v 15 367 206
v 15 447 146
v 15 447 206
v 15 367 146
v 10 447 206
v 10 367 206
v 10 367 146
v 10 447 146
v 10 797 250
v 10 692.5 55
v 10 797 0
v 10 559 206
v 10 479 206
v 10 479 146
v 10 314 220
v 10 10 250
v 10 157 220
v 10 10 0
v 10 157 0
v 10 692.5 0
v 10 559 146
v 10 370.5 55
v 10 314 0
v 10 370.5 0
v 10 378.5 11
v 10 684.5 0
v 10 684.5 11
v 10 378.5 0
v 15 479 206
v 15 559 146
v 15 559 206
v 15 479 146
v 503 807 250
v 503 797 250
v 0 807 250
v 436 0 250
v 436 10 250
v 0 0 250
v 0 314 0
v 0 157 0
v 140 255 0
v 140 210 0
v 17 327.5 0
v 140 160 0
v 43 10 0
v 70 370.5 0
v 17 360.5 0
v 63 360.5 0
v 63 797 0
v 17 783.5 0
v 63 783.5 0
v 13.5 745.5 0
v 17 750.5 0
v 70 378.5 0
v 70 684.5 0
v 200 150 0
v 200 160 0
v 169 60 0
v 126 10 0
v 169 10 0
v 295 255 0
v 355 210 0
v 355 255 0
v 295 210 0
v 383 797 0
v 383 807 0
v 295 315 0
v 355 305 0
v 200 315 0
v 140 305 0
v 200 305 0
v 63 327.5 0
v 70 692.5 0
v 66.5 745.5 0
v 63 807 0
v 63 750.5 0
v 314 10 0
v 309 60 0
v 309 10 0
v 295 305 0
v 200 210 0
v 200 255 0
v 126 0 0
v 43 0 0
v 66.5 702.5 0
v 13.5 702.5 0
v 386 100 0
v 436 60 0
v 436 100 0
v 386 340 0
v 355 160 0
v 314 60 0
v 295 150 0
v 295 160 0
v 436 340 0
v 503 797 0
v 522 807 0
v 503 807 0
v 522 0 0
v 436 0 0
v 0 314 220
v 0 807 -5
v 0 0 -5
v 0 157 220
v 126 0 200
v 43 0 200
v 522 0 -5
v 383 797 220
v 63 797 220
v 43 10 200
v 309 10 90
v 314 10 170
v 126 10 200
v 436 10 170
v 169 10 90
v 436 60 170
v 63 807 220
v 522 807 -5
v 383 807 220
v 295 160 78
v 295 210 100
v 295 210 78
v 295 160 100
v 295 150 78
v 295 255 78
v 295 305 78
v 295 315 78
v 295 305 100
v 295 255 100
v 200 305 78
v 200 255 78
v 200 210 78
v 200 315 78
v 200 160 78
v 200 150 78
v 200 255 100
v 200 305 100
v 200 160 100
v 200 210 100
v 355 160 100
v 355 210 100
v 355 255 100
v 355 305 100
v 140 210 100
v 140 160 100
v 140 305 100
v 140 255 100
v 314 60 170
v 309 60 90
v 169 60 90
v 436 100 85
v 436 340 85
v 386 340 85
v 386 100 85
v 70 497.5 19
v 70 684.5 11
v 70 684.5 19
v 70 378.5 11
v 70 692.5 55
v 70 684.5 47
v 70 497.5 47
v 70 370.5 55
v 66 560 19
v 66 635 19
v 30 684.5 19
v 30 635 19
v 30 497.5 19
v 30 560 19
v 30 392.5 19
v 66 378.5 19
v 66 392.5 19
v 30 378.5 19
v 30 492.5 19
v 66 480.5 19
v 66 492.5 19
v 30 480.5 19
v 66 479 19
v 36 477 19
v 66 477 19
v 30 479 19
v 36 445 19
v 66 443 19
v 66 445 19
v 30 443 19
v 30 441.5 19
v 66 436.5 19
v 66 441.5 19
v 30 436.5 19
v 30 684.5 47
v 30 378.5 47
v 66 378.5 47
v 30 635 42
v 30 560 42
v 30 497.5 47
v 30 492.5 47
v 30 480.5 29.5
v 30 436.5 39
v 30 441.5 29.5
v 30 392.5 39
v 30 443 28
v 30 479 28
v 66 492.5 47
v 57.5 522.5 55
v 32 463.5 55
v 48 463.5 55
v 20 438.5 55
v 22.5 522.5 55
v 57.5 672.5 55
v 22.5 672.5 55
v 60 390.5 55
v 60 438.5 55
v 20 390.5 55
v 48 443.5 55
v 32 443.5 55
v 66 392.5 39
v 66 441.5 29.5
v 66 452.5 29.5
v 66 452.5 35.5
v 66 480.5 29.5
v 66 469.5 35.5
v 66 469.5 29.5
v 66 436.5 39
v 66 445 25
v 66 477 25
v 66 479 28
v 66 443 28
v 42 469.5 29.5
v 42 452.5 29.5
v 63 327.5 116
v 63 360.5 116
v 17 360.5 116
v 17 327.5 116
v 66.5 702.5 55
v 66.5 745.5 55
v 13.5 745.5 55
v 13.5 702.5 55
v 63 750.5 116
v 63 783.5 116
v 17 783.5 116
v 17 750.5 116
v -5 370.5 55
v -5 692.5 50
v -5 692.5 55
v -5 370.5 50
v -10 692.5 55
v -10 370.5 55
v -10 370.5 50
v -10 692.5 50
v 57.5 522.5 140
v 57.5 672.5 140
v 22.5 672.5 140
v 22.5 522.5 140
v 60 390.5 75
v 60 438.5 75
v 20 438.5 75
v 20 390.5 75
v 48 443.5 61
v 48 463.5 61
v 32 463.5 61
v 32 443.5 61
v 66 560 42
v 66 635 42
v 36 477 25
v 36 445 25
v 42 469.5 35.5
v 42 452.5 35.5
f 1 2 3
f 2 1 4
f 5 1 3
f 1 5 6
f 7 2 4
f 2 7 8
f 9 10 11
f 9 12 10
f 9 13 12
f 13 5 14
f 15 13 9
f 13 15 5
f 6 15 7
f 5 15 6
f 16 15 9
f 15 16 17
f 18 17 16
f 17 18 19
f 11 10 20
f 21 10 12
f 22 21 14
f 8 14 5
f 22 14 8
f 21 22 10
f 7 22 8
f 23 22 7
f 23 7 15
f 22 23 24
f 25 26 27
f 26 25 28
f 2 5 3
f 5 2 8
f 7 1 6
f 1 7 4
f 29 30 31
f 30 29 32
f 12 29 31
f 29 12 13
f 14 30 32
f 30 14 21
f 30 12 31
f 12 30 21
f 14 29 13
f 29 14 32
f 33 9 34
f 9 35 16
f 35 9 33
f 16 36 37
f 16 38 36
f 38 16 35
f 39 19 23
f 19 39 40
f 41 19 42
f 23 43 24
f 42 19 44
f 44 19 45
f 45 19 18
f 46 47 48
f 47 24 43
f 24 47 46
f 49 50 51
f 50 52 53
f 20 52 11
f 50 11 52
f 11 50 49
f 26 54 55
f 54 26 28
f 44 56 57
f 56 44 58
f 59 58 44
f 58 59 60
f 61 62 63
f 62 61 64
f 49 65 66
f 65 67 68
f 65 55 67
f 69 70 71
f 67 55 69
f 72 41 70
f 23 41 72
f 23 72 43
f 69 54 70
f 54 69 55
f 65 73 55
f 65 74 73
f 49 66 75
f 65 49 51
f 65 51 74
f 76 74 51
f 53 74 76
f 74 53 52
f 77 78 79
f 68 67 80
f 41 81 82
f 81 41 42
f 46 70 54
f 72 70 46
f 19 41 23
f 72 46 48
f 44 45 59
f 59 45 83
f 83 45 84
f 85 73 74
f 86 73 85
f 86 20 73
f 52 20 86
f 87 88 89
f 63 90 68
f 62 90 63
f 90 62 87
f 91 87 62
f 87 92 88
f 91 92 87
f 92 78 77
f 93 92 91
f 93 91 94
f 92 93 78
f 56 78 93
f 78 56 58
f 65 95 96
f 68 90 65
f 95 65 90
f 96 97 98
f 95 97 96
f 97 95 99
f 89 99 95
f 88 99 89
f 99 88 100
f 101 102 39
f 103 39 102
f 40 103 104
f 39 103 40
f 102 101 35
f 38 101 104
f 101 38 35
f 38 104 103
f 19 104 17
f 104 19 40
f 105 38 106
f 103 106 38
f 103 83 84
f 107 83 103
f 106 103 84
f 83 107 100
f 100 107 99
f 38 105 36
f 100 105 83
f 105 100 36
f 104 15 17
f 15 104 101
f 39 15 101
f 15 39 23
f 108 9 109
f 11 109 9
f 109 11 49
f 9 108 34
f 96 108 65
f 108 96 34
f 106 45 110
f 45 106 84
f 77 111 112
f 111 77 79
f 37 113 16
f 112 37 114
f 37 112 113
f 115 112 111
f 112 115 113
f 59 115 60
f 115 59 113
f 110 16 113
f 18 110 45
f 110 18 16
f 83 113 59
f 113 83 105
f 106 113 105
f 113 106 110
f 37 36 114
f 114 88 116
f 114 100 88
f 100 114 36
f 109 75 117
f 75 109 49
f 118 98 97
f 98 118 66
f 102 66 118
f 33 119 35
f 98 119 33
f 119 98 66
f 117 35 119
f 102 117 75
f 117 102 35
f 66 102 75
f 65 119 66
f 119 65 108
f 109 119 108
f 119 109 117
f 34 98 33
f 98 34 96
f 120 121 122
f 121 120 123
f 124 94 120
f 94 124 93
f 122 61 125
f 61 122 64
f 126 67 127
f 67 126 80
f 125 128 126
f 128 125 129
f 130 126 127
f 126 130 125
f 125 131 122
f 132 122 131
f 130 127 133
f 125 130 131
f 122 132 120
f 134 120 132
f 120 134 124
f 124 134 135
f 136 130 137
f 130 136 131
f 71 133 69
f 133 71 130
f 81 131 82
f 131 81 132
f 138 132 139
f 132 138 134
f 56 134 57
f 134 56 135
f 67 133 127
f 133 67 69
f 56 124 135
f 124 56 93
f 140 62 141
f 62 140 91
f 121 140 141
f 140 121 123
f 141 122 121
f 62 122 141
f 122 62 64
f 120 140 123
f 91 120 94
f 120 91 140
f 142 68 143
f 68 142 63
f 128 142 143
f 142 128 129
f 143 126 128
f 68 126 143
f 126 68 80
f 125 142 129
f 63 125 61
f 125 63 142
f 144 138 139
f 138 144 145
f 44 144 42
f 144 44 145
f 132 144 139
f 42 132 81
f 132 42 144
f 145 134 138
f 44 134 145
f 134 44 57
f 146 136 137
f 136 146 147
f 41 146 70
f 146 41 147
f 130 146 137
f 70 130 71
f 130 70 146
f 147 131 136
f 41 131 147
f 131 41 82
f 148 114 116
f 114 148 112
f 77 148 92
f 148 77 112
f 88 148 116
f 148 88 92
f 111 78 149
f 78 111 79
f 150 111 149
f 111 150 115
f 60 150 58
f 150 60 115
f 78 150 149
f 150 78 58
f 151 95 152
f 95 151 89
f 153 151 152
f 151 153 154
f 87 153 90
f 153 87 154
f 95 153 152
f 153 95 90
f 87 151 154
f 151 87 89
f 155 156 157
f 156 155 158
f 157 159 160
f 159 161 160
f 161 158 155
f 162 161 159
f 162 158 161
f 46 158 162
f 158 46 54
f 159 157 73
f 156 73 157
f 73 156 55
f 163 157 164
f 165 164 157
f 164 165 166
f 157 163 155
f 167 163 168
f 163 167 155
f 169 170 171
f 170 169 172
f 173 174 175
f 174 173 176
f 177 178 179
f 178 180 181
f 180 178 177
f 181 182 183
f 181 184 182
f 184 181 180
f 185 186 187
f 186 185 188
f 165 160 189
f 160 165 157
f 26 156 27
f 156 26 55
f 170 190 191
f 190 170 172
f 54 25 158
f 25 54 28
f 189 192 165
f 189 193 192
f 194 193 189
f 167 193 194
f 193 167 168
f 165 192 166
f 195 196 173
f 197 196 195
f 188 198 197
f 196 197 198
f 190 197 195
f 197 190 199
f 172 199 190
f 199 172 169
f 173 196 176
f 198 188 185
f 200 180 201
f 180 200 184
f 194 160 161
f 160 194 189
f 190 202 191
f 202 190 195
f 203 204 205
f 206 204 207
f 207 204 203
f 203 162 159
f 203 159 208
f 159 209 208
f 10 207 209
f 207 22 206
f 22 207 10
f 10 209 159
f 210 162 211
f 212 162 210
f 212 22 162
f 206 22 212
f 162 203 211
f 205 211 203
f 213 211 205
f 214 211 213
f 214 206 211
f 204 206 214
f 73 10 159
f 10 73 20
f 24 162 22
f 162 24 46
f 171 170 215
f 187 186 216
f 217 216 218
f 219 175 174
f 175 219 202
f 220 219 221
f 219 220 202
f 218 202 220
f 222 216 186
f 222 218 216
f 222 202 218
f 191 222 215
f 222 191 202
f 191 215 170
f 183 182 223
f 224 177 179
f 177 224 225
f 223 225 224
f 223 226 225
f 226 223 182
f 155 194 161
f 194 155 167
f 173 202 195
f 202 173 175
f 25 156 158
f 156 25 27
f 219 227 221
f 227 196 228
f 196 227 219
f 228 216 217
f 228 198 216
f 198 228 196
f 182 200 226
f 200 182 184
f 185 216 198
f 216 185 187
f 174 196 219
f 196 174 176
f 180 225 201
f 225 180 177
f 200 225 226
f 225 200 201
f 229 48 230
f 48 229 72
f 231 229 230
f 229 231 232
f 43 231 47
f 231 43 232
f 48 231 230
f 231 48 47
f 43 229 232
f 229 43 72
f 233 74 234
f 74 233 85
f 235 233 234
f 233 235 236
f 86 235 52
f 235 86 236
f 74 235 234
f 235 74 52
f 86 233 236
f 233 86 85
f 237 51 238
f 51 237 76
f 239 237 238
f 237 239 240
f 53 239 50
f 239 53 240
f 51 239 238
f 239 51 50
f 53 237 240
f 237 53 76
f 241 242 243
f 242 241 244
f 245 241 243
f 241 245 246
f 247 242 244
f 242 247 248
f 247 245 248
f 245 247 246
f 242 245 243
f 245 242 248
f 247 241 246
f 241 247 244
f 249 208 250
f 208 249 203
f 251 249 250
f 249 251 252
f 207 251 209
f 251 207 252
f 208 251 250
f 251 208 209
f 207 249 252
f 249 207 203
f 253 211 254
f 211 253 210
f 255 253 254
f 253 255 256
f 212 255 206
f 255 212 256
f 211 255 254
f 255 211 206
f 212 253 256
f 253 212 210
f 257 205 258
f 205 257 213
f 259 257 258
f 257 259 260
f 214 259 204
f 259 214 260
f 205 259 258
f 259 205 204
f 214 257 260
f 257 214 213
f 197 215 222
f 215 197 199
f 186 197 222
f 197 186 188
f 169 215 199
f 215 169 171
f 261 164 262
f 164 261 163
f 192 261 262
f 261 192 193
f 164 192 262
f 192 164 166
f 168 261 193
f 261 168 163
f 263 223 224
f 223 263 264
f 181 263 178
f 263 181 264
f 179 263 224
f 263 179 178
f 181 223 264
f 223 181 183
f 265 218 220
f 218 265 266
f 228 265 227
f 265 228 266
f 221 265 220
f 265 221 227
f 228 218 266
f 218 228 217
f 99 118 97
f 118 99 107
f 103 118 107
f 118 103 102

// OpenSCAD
wall_height = 250;
door_to_window = 157;
window_width = 157;
window_height = 220;
window_to_end = 483;
wall_thickness = 10;

room_length = door_to_window + window_width + window_to_end + wall_thickness;
room_width = 320 + 120 + 82;

window_offset = door_to_window + window_width;

stone_floor();
tv_wall();
piano_wall();
garden_wall();
// kitchen_wall();
// kitchen();
furniture();

// toys(window_offset);
av(window_offset, window_to_end);

module stone_floor() {
  translate([0, 0, -5])
    color("GhostWhite") cube([room_width, room_length, 5]);
}

module tv_wall() {
  // Left Wall part
  color("AntiqueWhite") cube([wall_thickness, door_to_window, wall_height]);

  // Wall part above window
  translate([0, door_to_window, window_height])
    color("AntiqueWhite") cube([wall_thickness, window_width, 30]);

  // Big wall part
  translate([0, door_to_window + window_width, 0])
    color("AntiqueWhite") cube([wall_thickness, window_to_end, wall_height]);

  pictures(window_offset);
}

module piano_wall() {
  // Left Wall part
  translate([wall_thickness, 0, 0]) color("AntiqueWhite") cube([33, wall_thickness, wall_height]);
  translate([wall_thickness + 33, 0, 200]) color("AntiqueWhite") cube([83, wall_thickness, 50]);
  translate([wall_thickness + 33 + 83, 0, 0]) color("AntiqueWhite") cube([310, wall_thickness, wall_height]);
}

module garden_wall() {
  // Side wall part
  translate([0, door_to_window + window_width + window_to_end, 0]) color("AntiqueWhite") cube([63, wall_thickness, wall_height]);
  translate([63, door_to_window + window_width + window_to_end, window_height]) color("AntiqueWhite") cube([320, wall_thickness, 30]);
  translate([63 + 320, door_to_window + window_width + window_to_end, 0]) color("AntiqueWhite") cube([120, wall_thickness, wall_height]);
}

module kitchen_wall() {
  // Back wall
  translate([wall_thickness + 33 + 83 + 310, 0, 0]) color("AntiqueWhite") cube([85, door_to_window + window_width + window_to_end - 370, wall_height]);
}

module kitchen() {
  // Kitchen
  translate([wall_thickness + 33 + 83 + 310 + 30, door_to_window + window_width + window_to_end - 370, 0]) color("AntiqueWhite") cube([85 - 30, 370 - 97, 93]);
  translate([wall_thickness + 33 + 83 + 310, door_to_window + window_width + window_to_end - 370, 93 - 4]) color("AntiqueWhite") cube([30, 370 - 97, 4]);
  translate([wall_thickness + 33 + 83 + 310, door_to_window + window_width + window_to_end - 97 - 4, 0]) color("AntiqueWhite") cube([30, 4, 93]);
}

module pictures(start) {
  picture_height = 60;
  picture_width = 80;
  picture_floor = 146;
  picture_window = 53;

  // Left Picture Frame
  translate([wall_thickness, start + picture_window, picture_floor]) {
    color("DimGray") cube([5, picture_width, picture_height]);

    // Right Picture Frame
    translate([0, picture_width + 32, 0])
      color("DimGray") cube([5, picture_width, picture_height]);
  }
}

module furniture() {
  // Drinks
  translate([wall_thickness + 33 + 83 + 310 - 122, wall_thickness, 0]) color("DarkGoldenrod") cube([122, 50, 170]);

  // Piano
  translate([wall_thickness + 33 + 83 + 310 - 122 - 140 - 5, wall_thickness, 0]) color("Black") cube([140, 50, 90]);

  // Stuff
  translate([wall_thickness + 33 + 83 + 310 - 50, 100, 0]) color("DarkGoldenrod") cube([50, 240, 85]);

  // Table
  translate([200, 150, 0]) {
    color("Wheat") cube([95, 165, 78]);

    // Chairs
    translate([95, 10, 0]) color("Burlywood") cube([60, 50, 100]);
    translate([95, 165 - 10 - 50, 0]) color("Burlywood") cube([60, 50, 100]);

    translate([-60, 10, 0]) color("Burlywood") cube([60, 50, 100]);
    translate([-60, 165 - 10 - 50, 0]) color("Burlywood") cube([60, 50, 100]);
  }
}

module toys(start) {
  mat_width = 200;
  mat_height = 5;
  mat_depth = 100;

  ikea_part_width = 31;
  ikea_depth = 43;
  ikea_total = ikea_part_width * 3;

  // wall_offset = wall_thickness;
  wall_offset = 200;

  // Play mat
  translate([wall_offset, start, 0])
    color("SeaGreen") cube([mat_depth, mat_width, mat_height]);

  // Ikea speelgoed
  translate([wall_offset, start + mat_width - ikea_total, mat_height]) {
    union() {
      color("Goldenrod") cube([ikea_depth, ikea_part_width, 40]);

      translate([0, ikea_part_width, 0])
        color("Goldenrod") cube([ikea_depth, ikea_part_width, 65]);

      translate([0, ikea_part_width * 2, 0])
        color("Goldenrod") cube([ikea_depth, ikea_part_width, 90]);
    }
  }
}

module av(start, available) {
  speaker_depth = 46;
  speaker_width = 33;
  speaker_height = 116;

  subwoofer_depth = 53;
  subwoofer_width = 43;
  subwoofer_height = 55;

  tv_depth = 35;
  tv_width = 150;
  tv_height = 85;

  lp_depth = 40;
  lp_width = 48;
  lp_height = 20;

  preamp_depth = 16;
  preamp_width = 20;
  preamp_height = 6;

  av_depth = 40;
  av_width = 44;
  av_height = 20;

  center_depth = 40;
  center_width = 75;
  center_height = 23;

  ps_depth = 30;
  ps_width = 32;
  ps_height = 6;

  nuc_depth = 24;
  nuc_width = 17;
  nuc_height = 6;

  eye_height = 97.5;
  tv_center = tv_height / 2;
  tv_floor = eye_height - tv_center;

  safety_depth = 20;
  furniture_depth = safety_depth + max(
    av_depth,
    center_depth,
    lp_depth,
    preamp_depth,
    ps_depth,
    nuc_depth);

  safety_height = 5;
  audio_width = center_width + av_width + 30;
  audio_height = safety_height + max(center_height, av_height);

  metal_bars_width = 8;
  furniture_width = max(
    20 + tv_width + 60 + lp_width + 20 + preamp_width + 20,
    audio_width)
    - metal_bars_width
    - metal_bars_width;

  floor_furniture_spacing = 11;

  furniture_center = furniture_depth / 2;
  furniture_height = max(
    tv_floor,
    audio_height) - floor_furniture_spacing;

  total_width =
    speaker_width + 10 + furniture_width + 10 + subwoofer_width + 5 + speaker_width;

  // Possible furniture
  translate([wall_thickness, start + available / 2 - total_width / 2 + speaker_width + 10, 0]) {
    start_av_pieces = floor_furniture_spacing + furniture_height / 2 - audio_height / 2;
    top_height = start_av_pieces - floor_furniture_spacing;
    wood_height = top_height / 8 * 3;
    metal_height = top_height / 8 * 5;

    lp_start = 20;
    av_start = lp_start + lp_width / 2 - av_width / 2;

    door_depth = 4;
    door_open = true;
    $t = 0; // This is passed in from AutoCad 0-1
    door_percentage_open = $t * 100;
    spacer_width = 5;
    union () {
      spacer_start = round((furniture_width - metal_bars_width - metal_bars_width) / 100 * 40);
      door_width = spacer_start - metal_bars_width + spacer_width;

      // Now 58
      echo ("Meubel Width: ", furniture_width, ", Meubel Height: ", furniture_height + floor_furniture_spacing, "Meubel Depth: ", furniture_depth);
      echo ("Height plate: ", top_height);
      echo ("Height wood plate: ", wood_height);
      echo ("Height metal plate: ", metal_height);
      echo ("Metal width: ", metal_bars_width);
      echo ("Furniture width - metal: ", furniture_width - metal_bars_width - metal_bars_width);

      echo ("AV width: ", spacer_start);
      echo ("Spacer width: ", spacer_width);
      echo ("Speaker width: ", furniture_width - metal_bars_width - metal_bars_width - spacer_start - spacer_width);
      echo ("Door width: ", door_width);
      echo ("Door depth: ", door_depth);

      color("OrangeRed") {
        translate([0, metal_bars_width, floor_furniture_spacing + metal_height]) cube([furniture_depth, furniture_width - metal_bars_width - metal_bars_width, wood_height]);
        translate([0, metal_bars_width, start_av_pieces]) cube([20, furniture_width - metal_bars_width - metal_bars_width, furniture_height - top_height - top_height]);
        translate([0, 0, start_av_pieces + audio_height + metal_height]) cube([furniture_depth, furniture_width, wood_height]);

        translate([0, spacer_start, start_av_pieces]) cube([furniture_depth - door_depth, spacer_width, furniture_height - top_height - top_height]);
      }

      if (!door_open) {
        color("OrangeRed")
        translate([furniture_depth - door_depth, metal_bars_width, start_av_pieces])
        cube([door_depth, door_width, furniture_height - top_height - top_height]);
      }

      if (door_open) {
        color("OrangeRed")
        translate([furniture_depth - door_depth, metal_bars_width + ((door_width - spacer_width) / 100 * door_percentage_open), start_av_pieces])
        cube([door_depth, door_width, furniture_height - top_height - top_height]);
      }

      echo ("Spacing floor: ", floor_furniture_spacing);
      echo ("Audio Space: ", audio_height);

      color("Black") {
        translate([0, 0, 0]) cube([furniture_depth, metal_bars_width, furniture_height + floor_furniture_spacing - top_height]);
        translate([0, furniture_width - metal_bars_width, 0]) cube([furniture_depth, metal_bars_width, furniture_height + floor_furniture_spacing - top_height]);

        translate([0, 0, start_av_pieces + audio_height]) cube([furniture_depth, furniture_width, metal_height]);
        translate([0, metal_bars_width, floor_furniture_spacing]) cube([furniture_depth, furniture_width - metal_bars_width - metal_bars_width, metal_height]);
      }
    }

    // Left Speaker
    translate([furniture_center - speaker_depth / 2, -speaker_width - 10, 0])
      color("SaddleBrown") cube([speaker_depth, speaker_width, speaker_height]);

    // Subwoofer
    translate([furniture_center - subwoofer_depth / 2, furniture_width + 10, 0])
      color("Snow") cube([subwoofer_depth, subwoofer_width, subwoofer_height]);

    // Right Speaker
    translate([furniture_center - speaker_depth / 2, furniture_width + 10 + subwoofer_width + 5, 0])
      color("SaddleBrown") cube([speaker_depth, speaker_width, speaker_height]);

    // TV should not be higher than this line
    translate([-20, 0, tv_floor - 5])
      color("Red") cube([5, furniture_width, 5]);

    // TV
    tv_start = furniture_width - tv_width - 20;
    translate([furniture_center - tv_depth / 2, tv_start, furniture_height + floor_furniture_spacing])
      color("Gold") cube([tv_depth, tv_width, tv_height]);

    // Record Player
    translate([furniture_center - lp_depth / 2, lp_start, furniture_height + floor_furniture_spacing])
      color("Maroon") cube([lp_depth, lp_width, lp_height]);

    // Phono Preamp
    translate([furniture_center - preamp_depth / 2, lp_start + lp_width + 5, furniture_height + floor_furniture_spacing])
      color("Sienna") cube([preamp_depth, preamp_width, preamp_height]);

    // AV Receiver
    translate([furniture_depth - av_depth - door_depth, av_start, start_av_pieces])
      color("Silver") cube([av_depth, av_width, av_height]);

    // Center Speaker
    translate([furniture_depth - center_depth - door_depth, tv_start + tv_width / 2 - center_width / 2, start_av_pieces])
      color("Snow") cube([center_depth, center_width, center_height]);

    // NUC Stand
    ps_spacer_width = 1.5;
    ps_spacing_top = 3;
    union () {
      translate([0, av_start + av_width + 5, start_av_pieces])
        color("OrangeRed") cube([furniture_depth - door_depth, ps_spacer_width, ps_height + ps_spacing_top + ps_spacer_width]);

      translate([0, av_start + av_width + 5 + ps_spacer_width + 2 + ps_width + 2, start_av_pieces])
        color("OrangeRed") cube([furniture_depth - door_depth, ps_spacer_width, ps_height + ps_spacing_top + ps_spacer_width]);

      translate([0, av_start + av_width + 5 + ps_spacer_width, start_av_pieces + ps_height + ps_spacing_top])
        color("OrangeRed") cube([furniture_depth - door_depth, 2 + ps_width + 2, ps_spacer_width]);
    }

    // Playstation
    translate([furniture_depth - ps_depth - door_depth, av_start + av_width + 5 + ps_spacer_width + 2, start_av_pieces])
      color("Crimson") cube([ps_depth, ps_width, ps_height]);

    // NUC
    translate([furniture_depth - nuc_depth - door_depth, av_start + av_width + 5 + ps_spacer_width  + ((2 + ps_width + 2) / 2) - (nuc_width / 2), start_av_pieces + ps_height + ps_spacing_top + ps_spacer_width])
      color("Indigo") cube([nuc_depth, nuc_width, nuc_height]);
  }
}
